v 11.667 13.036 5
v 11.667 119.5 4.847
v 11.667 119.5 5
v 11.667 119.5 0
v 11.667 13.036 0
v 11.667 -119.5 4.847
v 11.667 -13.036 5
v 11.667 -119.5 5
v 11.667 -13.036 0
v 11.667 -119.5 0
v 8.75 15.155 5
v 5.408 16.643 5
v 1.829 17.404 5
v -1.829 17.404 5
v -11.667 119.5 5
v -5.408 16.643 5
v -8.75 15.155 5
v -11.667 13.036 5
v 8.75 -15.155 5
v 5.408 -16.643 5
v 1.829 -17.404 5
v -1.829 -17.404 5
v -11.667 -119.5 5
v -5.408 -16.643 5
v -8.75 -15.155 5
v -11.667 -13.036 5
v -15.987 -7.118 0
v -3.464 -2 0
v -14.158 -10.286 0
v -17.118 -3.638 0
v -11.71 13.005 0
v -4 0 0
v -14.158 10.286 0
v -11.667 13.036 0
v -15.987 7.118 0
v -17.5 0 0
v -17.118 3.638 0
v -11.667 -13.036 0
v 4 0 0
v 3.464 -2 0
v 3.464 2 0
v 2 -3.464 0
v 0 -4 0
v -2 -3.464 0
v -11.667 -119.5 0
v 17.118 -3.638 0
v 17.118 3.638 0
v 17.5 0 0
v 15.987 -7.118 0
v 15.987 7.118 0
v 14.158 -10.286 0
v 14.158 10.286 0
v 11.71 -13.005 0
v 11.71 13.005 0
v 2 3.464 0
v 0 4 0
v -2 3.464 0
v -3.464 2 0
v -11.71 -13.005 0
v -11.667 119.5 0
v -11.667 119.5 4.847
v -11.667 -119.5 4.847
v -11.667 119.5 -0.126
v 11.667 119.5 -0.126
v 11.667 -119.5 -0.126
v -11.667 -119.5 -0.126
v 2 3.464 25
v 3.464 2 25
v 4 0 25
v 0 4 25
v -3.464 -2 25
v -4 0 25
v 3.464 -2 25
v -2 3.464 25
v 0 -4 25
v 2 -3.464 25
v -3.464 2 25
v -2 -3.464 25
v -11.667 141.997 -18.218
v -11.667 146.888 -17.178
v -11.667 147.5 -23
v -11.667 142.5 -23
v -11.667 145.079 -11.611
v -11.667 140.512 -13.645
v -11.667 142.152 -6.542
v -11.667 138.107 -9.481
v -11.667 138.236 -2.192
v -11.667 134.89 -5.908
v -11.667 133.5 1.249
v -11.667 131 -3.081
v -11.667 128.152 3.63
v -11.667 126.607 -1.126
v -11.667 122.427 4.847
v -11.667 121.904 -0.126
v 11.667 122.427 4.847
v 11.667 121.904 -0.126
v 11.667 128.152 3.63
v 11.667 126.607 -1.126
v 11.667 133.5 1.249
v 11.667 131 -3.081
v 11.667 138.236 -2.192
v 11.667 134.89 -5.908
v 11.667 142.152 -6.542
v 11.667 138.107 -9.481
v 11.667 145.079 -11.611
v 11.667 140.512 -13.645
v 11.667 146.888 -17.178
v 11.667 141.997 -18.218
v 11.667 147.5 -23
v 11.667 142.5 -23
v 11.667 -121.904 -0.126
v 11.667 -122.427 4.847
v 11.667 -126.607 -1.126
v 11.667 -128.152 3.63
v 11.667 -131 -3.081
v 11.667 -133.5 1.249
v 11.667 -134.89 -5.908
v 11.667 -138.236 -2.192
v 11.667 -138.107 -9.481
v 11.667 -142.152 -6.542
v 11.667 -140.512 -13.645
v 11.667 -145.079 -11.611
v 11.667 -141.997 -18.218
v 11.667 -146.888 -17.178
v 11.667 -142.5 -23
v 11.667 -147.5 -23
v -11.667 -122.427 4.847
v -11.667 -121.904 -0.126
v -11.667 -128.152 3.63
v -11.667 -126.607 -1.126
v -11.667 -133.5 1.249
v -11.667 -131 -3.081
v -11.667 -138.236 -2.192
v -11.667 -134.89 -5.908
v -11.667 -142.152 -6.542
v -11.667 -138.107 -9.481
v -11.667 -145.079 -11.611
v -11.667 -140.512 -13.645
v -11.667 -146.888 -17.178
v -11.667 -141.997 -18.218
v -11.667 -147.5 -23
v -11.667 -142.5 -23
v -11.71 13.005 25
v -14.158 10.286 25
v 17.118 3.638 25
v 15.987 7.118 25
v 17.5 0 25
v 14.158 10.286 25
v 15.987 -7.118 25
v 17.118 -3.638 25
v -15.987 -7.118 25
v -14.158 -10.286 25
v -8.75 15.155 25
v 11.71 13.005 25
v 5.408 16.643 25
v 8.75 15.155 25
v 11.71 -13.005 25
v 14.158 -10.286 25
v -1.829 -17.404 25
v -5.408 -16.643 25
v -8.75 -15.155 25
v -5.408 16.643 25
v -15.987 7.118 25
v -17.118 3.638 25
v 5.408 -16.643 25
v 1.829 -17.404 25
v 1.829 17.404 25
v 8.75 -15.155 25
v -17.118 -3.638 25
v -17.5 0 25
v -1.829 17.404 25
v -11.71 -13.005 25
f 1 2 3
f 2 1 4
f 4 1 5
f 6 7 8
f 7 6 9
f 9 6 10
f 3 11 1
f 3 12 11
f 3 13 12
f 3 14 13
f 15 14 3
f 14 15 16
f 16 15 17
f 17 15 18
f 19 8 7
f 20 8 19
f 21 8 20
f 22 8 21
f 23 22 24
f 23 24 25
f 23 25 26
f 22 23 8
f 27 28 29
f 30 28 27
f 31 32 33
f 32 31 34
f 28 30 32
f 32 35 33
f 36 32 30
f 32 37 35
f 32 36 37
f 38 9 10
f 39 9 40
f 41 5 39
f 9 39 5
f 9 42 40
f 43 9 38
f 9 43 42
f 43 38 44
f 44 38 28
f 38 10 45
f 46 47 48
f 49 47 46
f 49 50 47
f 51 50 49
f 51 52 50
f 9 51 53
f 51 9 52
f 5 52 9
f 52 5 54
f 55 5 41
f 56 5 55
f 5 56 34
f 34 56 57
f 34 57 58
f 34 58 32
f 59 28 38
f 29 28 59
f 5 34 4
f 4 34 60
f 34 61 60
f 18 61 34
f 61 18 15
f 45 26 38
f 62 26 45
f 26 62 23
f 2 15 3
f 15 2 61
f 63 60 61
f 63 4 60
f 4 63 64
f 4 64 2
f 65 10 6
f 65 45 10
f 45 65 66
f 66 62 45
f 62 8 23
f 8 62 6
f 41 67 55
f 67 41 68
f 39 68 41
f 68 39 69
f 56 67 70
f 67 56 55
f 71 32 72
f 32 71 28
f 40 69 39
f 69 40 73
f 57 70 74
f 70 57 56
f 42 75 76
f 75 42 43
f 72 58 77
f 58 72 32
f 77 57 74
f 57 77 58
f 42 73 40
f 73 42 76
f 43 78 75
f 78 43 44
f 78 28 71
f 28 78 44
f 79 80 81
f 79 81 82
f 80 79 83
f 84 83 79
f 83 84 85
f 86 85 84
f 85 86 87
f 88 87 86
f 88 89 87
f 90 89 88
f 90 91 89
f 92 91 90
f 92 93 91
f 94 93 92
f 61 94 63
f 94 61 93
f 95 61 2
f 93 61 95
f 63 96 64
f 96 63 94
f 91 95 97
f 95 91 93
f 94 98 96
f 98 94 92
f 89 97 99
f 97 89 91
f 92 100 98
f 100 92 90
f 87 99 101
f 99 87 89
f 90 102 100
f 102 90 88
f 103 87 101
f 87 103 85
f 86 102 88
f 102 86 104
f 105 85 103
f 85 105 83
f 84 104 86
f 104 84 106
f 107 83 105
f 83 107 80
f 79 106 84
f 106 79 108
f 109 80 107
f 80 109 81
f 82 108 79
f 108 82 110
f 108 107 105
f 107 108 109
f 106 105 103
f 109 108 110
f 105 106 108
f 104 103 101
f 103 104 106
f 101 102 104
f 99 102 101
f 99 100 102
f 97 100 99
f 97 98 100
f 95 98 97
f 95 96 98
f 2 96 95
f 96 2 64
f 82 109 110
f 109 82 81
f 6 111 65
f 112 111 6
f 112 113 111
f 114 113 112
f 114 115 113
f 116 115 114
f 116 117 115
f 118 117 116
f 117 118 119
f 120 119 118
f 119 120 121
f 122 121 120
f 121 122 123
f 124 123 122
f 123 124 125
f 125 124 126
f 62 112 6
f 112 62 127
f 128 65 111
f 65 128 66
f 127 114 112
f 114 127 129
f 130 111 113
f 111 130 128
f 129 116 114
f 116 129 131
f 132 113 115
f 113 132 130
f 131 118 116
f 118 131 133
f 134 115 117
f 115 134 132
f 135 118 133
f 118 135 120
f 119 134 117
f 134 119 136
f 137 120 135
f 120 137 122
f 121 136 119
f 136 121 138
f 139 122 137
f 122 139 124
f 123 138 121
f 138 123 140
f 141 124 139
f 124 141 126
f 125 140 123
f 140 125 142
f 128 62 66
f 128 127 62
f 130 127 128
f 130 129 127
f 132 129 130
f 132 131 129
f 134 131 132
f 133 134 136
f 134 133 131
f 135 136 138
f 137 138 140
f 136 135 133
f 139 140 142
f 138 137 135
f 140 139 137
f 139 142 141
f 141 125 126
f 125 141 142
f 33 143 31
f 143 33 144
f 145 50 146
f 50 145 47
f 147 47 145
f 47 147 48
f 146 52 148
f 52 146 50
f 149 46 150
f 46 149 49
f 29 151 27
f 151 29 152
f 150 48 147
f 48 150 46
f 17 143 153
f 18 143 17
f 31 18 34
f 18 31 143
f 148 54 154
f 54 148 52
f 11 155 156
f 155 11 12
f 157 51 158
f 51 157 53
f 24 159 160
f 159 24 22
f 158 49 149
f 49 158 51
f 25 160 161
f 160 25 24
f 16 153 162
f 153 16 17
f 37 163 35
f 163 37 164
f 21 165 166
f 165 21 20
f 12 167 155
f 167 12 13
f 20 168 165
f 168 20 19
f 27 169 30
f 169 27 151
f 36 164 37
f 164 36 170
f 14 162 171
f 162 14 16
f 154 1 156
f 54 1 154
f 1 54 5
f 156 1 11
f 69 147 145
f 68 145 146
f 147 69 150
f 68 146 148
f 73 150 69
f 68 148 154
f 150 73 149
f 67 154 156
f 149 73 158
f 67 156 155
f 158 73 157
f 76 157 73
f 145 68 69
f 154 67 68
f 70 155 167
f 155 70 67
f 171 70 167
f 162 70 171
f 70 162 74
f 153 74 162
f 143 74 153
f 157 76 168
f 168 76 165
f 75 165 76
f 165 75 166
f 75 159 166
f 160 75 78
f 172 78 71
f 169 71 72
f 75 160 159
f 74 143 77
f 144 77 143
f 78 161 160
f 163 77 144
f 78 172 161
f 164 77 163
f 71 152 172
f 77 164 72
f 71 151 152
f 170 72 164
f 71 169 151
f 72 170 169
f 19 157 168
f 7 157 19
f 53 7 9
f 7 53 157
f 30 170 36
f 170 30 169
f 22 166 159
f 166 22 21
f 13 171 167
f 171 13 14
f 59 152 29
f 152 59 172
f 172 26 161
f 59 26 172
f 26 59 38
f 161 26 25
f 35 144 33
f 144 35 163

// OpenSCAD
// file: InFluMa_Holes.scad
NoA=3;

// Bohrungen ====================================

DACO=8;     //Diameter Axis Cut Out
DScDAS=3;   //Diameter Screw Disc Attach Star
DScDASHAD=DScDAS*4;// Diameter Screw Head Disc Attach Star
DoBearFit=22;	//Diameter of Bearing

Pos_X=0;
Pos_Y=0;
Pos_Z=0;

// Dimensions ====================================

HoDAS=15;   //Height of DiscAttachStar

AHDC=100; // Atach Hole Diameter Circle

//AxisCutOut();

// Helping Parameters ====================================

MFN=12; // Main Faccette Number

// ====================================

AxisCutOut(Pos_X,Pos_Y,Pos_Z,DACO);
AttachScrews(NoA,AHDC);

module AxisCutOut(Pos_X,Pos_Y,Pos_Z,DACO){
	translate([Pos_X,Pos_Y,Pos_Z]){
		cylinder(h=HoDAS*20,d1=DACO,d2=DACO,center=true,$fn=MFN);
	}
}

module AttachScrews(NoA,AHDC){
AbArm=360/NoA;  // Angle between Arms
     for(i=[0:AbArm:360]){
        rotate([0,0,i]){
            translate([AHDC/2,0,0]){
                cylinder(66,d1=DScDAS,d2=DScDAS,center=true,$fn=MFN);
				AttachScrewsRest();				
/*				translate([0,0,HoDAS/2.3]){
					hull(){
						cylinder(HoDAS,d1=DScDAS*3,d2=DScDAS*3,center=true,$fn=MFN);
						translate([DScDAS*3,0,0]){
							cylinder(HoDAS,d1=DScDAS*3,d2=DScDAS*3,center=true,$fn=MFN);
						}
					}
				}*/
            }
         }
     }
 }
 
module AttachScrewsRest(){
translate([0,0,HoDAS/2]){
	hull(){
		cylinder(HoDAS,d1=DScDASHAD,d2=DScDASHAD,center=true,$fn=MFN);
			translate([DScDAS*3,0,0]){
				cylinder(HoDAS,d1=DScDASHAD,d2=DScDASHAD,center=true,$fn=MFN);
			}
		}
	}
}
// main file
use <InFluMa_Holes.scad>


HoDAS=15;	//Height of DiscAttachStar
HoBar=20;	// Height of Barrel that becomes atatched at the DiscAttachStar in Z-Axis (HoDAS)

whith_y=250;	//
DoBar=35;
HoBarEQR=25;		// Heiht of Barrel Equalizerg

Beam_x=DoBar*2/3;
//Beam_y=150;
HoBeam=5;			// Heigt of Eqalizer Beam

Clear_EQR=12;		// Clearance Eaqualizer vs Disc
// Clearance Eaqualizer vs Disc



Arm_EQR(whith_y,HoBarEQR,DoBar);



module Arm_EQR(whith_y,HoBarEQR,DoBar){
	difference(){
		union(){		
			cylinder(h=HoBarEQR,d1=DoBar,d2=DoBar,center=false);
		}
		translate([0,0,0]){
				Beam_EQR(DoBar,whith_y,HoBeam,HoDAS,HoBar,Clear_EQR);
			}
		AxisCutOut(0,0,0,8);
	}
		//Beam_EQR(DoBar,whith_y,HoBeam);
}

Beam_EQR(DoBar,whith_y,HoBeam,HoDAS,HoBar,Clear_EQR);

module Beam_EQR(DoBar,whith_y,HoBeam,HoDAS,HoBar,Clear_EQR){
	union(){
		difference(){
			translate([0,0,HoBeam/2]){
			cube([2*DoBar/3,whith_y-HoDAS-HoBar+Clear_EQR*2,HoBeam],center=true);
			}
			AxisCutOut(0,0,0,8);
		}
		translate([-2*DoBar/6,whith_y/2-(HoDAS+HoBar)/2+Clear_EQR,-HoBar-HoDAS+Clear_EQR]){
			rotate([90,0,90]){
				Elbow_EQR(2*DoBar/3,HoBeam,HoBar+HoDAS-Clear_EQR);
			}
		}
		translate([2*DoBar/6,-whith_y/2+(HoDAS+HoBar)/2-Clear_EQR,-HoBar-HoDAS+Clear_EQR]){
			rotate([90,0,-90]){
				Elbow_EQR(2*DoBar/3,HoBeam,HoBar+HoDAS-Clear_EQR);
			}
		}
	}
}



module Elbow_EQR(DoBar_Elbow,HoBeam,RAD_EQR){
	intersection(){
		rotate_extrude(convexity = 10){
			translate([RAD_EQR, 0, 0])
				square([HoBeam,DoBar_Elbow],center=false);
			}
		cube(100);
	}
}
/*
rotate_extrude(angle=90, convexity=2){
	translate([2*DoBar+55,0,0]){
		rotate([0,0,0]){
			#square([100,3],center=true);
		}
	}
}

#square([20,5],center=true);

translate([0,0,-20]){
//resize([2,4,5]){ cube();
//}
}
*/
